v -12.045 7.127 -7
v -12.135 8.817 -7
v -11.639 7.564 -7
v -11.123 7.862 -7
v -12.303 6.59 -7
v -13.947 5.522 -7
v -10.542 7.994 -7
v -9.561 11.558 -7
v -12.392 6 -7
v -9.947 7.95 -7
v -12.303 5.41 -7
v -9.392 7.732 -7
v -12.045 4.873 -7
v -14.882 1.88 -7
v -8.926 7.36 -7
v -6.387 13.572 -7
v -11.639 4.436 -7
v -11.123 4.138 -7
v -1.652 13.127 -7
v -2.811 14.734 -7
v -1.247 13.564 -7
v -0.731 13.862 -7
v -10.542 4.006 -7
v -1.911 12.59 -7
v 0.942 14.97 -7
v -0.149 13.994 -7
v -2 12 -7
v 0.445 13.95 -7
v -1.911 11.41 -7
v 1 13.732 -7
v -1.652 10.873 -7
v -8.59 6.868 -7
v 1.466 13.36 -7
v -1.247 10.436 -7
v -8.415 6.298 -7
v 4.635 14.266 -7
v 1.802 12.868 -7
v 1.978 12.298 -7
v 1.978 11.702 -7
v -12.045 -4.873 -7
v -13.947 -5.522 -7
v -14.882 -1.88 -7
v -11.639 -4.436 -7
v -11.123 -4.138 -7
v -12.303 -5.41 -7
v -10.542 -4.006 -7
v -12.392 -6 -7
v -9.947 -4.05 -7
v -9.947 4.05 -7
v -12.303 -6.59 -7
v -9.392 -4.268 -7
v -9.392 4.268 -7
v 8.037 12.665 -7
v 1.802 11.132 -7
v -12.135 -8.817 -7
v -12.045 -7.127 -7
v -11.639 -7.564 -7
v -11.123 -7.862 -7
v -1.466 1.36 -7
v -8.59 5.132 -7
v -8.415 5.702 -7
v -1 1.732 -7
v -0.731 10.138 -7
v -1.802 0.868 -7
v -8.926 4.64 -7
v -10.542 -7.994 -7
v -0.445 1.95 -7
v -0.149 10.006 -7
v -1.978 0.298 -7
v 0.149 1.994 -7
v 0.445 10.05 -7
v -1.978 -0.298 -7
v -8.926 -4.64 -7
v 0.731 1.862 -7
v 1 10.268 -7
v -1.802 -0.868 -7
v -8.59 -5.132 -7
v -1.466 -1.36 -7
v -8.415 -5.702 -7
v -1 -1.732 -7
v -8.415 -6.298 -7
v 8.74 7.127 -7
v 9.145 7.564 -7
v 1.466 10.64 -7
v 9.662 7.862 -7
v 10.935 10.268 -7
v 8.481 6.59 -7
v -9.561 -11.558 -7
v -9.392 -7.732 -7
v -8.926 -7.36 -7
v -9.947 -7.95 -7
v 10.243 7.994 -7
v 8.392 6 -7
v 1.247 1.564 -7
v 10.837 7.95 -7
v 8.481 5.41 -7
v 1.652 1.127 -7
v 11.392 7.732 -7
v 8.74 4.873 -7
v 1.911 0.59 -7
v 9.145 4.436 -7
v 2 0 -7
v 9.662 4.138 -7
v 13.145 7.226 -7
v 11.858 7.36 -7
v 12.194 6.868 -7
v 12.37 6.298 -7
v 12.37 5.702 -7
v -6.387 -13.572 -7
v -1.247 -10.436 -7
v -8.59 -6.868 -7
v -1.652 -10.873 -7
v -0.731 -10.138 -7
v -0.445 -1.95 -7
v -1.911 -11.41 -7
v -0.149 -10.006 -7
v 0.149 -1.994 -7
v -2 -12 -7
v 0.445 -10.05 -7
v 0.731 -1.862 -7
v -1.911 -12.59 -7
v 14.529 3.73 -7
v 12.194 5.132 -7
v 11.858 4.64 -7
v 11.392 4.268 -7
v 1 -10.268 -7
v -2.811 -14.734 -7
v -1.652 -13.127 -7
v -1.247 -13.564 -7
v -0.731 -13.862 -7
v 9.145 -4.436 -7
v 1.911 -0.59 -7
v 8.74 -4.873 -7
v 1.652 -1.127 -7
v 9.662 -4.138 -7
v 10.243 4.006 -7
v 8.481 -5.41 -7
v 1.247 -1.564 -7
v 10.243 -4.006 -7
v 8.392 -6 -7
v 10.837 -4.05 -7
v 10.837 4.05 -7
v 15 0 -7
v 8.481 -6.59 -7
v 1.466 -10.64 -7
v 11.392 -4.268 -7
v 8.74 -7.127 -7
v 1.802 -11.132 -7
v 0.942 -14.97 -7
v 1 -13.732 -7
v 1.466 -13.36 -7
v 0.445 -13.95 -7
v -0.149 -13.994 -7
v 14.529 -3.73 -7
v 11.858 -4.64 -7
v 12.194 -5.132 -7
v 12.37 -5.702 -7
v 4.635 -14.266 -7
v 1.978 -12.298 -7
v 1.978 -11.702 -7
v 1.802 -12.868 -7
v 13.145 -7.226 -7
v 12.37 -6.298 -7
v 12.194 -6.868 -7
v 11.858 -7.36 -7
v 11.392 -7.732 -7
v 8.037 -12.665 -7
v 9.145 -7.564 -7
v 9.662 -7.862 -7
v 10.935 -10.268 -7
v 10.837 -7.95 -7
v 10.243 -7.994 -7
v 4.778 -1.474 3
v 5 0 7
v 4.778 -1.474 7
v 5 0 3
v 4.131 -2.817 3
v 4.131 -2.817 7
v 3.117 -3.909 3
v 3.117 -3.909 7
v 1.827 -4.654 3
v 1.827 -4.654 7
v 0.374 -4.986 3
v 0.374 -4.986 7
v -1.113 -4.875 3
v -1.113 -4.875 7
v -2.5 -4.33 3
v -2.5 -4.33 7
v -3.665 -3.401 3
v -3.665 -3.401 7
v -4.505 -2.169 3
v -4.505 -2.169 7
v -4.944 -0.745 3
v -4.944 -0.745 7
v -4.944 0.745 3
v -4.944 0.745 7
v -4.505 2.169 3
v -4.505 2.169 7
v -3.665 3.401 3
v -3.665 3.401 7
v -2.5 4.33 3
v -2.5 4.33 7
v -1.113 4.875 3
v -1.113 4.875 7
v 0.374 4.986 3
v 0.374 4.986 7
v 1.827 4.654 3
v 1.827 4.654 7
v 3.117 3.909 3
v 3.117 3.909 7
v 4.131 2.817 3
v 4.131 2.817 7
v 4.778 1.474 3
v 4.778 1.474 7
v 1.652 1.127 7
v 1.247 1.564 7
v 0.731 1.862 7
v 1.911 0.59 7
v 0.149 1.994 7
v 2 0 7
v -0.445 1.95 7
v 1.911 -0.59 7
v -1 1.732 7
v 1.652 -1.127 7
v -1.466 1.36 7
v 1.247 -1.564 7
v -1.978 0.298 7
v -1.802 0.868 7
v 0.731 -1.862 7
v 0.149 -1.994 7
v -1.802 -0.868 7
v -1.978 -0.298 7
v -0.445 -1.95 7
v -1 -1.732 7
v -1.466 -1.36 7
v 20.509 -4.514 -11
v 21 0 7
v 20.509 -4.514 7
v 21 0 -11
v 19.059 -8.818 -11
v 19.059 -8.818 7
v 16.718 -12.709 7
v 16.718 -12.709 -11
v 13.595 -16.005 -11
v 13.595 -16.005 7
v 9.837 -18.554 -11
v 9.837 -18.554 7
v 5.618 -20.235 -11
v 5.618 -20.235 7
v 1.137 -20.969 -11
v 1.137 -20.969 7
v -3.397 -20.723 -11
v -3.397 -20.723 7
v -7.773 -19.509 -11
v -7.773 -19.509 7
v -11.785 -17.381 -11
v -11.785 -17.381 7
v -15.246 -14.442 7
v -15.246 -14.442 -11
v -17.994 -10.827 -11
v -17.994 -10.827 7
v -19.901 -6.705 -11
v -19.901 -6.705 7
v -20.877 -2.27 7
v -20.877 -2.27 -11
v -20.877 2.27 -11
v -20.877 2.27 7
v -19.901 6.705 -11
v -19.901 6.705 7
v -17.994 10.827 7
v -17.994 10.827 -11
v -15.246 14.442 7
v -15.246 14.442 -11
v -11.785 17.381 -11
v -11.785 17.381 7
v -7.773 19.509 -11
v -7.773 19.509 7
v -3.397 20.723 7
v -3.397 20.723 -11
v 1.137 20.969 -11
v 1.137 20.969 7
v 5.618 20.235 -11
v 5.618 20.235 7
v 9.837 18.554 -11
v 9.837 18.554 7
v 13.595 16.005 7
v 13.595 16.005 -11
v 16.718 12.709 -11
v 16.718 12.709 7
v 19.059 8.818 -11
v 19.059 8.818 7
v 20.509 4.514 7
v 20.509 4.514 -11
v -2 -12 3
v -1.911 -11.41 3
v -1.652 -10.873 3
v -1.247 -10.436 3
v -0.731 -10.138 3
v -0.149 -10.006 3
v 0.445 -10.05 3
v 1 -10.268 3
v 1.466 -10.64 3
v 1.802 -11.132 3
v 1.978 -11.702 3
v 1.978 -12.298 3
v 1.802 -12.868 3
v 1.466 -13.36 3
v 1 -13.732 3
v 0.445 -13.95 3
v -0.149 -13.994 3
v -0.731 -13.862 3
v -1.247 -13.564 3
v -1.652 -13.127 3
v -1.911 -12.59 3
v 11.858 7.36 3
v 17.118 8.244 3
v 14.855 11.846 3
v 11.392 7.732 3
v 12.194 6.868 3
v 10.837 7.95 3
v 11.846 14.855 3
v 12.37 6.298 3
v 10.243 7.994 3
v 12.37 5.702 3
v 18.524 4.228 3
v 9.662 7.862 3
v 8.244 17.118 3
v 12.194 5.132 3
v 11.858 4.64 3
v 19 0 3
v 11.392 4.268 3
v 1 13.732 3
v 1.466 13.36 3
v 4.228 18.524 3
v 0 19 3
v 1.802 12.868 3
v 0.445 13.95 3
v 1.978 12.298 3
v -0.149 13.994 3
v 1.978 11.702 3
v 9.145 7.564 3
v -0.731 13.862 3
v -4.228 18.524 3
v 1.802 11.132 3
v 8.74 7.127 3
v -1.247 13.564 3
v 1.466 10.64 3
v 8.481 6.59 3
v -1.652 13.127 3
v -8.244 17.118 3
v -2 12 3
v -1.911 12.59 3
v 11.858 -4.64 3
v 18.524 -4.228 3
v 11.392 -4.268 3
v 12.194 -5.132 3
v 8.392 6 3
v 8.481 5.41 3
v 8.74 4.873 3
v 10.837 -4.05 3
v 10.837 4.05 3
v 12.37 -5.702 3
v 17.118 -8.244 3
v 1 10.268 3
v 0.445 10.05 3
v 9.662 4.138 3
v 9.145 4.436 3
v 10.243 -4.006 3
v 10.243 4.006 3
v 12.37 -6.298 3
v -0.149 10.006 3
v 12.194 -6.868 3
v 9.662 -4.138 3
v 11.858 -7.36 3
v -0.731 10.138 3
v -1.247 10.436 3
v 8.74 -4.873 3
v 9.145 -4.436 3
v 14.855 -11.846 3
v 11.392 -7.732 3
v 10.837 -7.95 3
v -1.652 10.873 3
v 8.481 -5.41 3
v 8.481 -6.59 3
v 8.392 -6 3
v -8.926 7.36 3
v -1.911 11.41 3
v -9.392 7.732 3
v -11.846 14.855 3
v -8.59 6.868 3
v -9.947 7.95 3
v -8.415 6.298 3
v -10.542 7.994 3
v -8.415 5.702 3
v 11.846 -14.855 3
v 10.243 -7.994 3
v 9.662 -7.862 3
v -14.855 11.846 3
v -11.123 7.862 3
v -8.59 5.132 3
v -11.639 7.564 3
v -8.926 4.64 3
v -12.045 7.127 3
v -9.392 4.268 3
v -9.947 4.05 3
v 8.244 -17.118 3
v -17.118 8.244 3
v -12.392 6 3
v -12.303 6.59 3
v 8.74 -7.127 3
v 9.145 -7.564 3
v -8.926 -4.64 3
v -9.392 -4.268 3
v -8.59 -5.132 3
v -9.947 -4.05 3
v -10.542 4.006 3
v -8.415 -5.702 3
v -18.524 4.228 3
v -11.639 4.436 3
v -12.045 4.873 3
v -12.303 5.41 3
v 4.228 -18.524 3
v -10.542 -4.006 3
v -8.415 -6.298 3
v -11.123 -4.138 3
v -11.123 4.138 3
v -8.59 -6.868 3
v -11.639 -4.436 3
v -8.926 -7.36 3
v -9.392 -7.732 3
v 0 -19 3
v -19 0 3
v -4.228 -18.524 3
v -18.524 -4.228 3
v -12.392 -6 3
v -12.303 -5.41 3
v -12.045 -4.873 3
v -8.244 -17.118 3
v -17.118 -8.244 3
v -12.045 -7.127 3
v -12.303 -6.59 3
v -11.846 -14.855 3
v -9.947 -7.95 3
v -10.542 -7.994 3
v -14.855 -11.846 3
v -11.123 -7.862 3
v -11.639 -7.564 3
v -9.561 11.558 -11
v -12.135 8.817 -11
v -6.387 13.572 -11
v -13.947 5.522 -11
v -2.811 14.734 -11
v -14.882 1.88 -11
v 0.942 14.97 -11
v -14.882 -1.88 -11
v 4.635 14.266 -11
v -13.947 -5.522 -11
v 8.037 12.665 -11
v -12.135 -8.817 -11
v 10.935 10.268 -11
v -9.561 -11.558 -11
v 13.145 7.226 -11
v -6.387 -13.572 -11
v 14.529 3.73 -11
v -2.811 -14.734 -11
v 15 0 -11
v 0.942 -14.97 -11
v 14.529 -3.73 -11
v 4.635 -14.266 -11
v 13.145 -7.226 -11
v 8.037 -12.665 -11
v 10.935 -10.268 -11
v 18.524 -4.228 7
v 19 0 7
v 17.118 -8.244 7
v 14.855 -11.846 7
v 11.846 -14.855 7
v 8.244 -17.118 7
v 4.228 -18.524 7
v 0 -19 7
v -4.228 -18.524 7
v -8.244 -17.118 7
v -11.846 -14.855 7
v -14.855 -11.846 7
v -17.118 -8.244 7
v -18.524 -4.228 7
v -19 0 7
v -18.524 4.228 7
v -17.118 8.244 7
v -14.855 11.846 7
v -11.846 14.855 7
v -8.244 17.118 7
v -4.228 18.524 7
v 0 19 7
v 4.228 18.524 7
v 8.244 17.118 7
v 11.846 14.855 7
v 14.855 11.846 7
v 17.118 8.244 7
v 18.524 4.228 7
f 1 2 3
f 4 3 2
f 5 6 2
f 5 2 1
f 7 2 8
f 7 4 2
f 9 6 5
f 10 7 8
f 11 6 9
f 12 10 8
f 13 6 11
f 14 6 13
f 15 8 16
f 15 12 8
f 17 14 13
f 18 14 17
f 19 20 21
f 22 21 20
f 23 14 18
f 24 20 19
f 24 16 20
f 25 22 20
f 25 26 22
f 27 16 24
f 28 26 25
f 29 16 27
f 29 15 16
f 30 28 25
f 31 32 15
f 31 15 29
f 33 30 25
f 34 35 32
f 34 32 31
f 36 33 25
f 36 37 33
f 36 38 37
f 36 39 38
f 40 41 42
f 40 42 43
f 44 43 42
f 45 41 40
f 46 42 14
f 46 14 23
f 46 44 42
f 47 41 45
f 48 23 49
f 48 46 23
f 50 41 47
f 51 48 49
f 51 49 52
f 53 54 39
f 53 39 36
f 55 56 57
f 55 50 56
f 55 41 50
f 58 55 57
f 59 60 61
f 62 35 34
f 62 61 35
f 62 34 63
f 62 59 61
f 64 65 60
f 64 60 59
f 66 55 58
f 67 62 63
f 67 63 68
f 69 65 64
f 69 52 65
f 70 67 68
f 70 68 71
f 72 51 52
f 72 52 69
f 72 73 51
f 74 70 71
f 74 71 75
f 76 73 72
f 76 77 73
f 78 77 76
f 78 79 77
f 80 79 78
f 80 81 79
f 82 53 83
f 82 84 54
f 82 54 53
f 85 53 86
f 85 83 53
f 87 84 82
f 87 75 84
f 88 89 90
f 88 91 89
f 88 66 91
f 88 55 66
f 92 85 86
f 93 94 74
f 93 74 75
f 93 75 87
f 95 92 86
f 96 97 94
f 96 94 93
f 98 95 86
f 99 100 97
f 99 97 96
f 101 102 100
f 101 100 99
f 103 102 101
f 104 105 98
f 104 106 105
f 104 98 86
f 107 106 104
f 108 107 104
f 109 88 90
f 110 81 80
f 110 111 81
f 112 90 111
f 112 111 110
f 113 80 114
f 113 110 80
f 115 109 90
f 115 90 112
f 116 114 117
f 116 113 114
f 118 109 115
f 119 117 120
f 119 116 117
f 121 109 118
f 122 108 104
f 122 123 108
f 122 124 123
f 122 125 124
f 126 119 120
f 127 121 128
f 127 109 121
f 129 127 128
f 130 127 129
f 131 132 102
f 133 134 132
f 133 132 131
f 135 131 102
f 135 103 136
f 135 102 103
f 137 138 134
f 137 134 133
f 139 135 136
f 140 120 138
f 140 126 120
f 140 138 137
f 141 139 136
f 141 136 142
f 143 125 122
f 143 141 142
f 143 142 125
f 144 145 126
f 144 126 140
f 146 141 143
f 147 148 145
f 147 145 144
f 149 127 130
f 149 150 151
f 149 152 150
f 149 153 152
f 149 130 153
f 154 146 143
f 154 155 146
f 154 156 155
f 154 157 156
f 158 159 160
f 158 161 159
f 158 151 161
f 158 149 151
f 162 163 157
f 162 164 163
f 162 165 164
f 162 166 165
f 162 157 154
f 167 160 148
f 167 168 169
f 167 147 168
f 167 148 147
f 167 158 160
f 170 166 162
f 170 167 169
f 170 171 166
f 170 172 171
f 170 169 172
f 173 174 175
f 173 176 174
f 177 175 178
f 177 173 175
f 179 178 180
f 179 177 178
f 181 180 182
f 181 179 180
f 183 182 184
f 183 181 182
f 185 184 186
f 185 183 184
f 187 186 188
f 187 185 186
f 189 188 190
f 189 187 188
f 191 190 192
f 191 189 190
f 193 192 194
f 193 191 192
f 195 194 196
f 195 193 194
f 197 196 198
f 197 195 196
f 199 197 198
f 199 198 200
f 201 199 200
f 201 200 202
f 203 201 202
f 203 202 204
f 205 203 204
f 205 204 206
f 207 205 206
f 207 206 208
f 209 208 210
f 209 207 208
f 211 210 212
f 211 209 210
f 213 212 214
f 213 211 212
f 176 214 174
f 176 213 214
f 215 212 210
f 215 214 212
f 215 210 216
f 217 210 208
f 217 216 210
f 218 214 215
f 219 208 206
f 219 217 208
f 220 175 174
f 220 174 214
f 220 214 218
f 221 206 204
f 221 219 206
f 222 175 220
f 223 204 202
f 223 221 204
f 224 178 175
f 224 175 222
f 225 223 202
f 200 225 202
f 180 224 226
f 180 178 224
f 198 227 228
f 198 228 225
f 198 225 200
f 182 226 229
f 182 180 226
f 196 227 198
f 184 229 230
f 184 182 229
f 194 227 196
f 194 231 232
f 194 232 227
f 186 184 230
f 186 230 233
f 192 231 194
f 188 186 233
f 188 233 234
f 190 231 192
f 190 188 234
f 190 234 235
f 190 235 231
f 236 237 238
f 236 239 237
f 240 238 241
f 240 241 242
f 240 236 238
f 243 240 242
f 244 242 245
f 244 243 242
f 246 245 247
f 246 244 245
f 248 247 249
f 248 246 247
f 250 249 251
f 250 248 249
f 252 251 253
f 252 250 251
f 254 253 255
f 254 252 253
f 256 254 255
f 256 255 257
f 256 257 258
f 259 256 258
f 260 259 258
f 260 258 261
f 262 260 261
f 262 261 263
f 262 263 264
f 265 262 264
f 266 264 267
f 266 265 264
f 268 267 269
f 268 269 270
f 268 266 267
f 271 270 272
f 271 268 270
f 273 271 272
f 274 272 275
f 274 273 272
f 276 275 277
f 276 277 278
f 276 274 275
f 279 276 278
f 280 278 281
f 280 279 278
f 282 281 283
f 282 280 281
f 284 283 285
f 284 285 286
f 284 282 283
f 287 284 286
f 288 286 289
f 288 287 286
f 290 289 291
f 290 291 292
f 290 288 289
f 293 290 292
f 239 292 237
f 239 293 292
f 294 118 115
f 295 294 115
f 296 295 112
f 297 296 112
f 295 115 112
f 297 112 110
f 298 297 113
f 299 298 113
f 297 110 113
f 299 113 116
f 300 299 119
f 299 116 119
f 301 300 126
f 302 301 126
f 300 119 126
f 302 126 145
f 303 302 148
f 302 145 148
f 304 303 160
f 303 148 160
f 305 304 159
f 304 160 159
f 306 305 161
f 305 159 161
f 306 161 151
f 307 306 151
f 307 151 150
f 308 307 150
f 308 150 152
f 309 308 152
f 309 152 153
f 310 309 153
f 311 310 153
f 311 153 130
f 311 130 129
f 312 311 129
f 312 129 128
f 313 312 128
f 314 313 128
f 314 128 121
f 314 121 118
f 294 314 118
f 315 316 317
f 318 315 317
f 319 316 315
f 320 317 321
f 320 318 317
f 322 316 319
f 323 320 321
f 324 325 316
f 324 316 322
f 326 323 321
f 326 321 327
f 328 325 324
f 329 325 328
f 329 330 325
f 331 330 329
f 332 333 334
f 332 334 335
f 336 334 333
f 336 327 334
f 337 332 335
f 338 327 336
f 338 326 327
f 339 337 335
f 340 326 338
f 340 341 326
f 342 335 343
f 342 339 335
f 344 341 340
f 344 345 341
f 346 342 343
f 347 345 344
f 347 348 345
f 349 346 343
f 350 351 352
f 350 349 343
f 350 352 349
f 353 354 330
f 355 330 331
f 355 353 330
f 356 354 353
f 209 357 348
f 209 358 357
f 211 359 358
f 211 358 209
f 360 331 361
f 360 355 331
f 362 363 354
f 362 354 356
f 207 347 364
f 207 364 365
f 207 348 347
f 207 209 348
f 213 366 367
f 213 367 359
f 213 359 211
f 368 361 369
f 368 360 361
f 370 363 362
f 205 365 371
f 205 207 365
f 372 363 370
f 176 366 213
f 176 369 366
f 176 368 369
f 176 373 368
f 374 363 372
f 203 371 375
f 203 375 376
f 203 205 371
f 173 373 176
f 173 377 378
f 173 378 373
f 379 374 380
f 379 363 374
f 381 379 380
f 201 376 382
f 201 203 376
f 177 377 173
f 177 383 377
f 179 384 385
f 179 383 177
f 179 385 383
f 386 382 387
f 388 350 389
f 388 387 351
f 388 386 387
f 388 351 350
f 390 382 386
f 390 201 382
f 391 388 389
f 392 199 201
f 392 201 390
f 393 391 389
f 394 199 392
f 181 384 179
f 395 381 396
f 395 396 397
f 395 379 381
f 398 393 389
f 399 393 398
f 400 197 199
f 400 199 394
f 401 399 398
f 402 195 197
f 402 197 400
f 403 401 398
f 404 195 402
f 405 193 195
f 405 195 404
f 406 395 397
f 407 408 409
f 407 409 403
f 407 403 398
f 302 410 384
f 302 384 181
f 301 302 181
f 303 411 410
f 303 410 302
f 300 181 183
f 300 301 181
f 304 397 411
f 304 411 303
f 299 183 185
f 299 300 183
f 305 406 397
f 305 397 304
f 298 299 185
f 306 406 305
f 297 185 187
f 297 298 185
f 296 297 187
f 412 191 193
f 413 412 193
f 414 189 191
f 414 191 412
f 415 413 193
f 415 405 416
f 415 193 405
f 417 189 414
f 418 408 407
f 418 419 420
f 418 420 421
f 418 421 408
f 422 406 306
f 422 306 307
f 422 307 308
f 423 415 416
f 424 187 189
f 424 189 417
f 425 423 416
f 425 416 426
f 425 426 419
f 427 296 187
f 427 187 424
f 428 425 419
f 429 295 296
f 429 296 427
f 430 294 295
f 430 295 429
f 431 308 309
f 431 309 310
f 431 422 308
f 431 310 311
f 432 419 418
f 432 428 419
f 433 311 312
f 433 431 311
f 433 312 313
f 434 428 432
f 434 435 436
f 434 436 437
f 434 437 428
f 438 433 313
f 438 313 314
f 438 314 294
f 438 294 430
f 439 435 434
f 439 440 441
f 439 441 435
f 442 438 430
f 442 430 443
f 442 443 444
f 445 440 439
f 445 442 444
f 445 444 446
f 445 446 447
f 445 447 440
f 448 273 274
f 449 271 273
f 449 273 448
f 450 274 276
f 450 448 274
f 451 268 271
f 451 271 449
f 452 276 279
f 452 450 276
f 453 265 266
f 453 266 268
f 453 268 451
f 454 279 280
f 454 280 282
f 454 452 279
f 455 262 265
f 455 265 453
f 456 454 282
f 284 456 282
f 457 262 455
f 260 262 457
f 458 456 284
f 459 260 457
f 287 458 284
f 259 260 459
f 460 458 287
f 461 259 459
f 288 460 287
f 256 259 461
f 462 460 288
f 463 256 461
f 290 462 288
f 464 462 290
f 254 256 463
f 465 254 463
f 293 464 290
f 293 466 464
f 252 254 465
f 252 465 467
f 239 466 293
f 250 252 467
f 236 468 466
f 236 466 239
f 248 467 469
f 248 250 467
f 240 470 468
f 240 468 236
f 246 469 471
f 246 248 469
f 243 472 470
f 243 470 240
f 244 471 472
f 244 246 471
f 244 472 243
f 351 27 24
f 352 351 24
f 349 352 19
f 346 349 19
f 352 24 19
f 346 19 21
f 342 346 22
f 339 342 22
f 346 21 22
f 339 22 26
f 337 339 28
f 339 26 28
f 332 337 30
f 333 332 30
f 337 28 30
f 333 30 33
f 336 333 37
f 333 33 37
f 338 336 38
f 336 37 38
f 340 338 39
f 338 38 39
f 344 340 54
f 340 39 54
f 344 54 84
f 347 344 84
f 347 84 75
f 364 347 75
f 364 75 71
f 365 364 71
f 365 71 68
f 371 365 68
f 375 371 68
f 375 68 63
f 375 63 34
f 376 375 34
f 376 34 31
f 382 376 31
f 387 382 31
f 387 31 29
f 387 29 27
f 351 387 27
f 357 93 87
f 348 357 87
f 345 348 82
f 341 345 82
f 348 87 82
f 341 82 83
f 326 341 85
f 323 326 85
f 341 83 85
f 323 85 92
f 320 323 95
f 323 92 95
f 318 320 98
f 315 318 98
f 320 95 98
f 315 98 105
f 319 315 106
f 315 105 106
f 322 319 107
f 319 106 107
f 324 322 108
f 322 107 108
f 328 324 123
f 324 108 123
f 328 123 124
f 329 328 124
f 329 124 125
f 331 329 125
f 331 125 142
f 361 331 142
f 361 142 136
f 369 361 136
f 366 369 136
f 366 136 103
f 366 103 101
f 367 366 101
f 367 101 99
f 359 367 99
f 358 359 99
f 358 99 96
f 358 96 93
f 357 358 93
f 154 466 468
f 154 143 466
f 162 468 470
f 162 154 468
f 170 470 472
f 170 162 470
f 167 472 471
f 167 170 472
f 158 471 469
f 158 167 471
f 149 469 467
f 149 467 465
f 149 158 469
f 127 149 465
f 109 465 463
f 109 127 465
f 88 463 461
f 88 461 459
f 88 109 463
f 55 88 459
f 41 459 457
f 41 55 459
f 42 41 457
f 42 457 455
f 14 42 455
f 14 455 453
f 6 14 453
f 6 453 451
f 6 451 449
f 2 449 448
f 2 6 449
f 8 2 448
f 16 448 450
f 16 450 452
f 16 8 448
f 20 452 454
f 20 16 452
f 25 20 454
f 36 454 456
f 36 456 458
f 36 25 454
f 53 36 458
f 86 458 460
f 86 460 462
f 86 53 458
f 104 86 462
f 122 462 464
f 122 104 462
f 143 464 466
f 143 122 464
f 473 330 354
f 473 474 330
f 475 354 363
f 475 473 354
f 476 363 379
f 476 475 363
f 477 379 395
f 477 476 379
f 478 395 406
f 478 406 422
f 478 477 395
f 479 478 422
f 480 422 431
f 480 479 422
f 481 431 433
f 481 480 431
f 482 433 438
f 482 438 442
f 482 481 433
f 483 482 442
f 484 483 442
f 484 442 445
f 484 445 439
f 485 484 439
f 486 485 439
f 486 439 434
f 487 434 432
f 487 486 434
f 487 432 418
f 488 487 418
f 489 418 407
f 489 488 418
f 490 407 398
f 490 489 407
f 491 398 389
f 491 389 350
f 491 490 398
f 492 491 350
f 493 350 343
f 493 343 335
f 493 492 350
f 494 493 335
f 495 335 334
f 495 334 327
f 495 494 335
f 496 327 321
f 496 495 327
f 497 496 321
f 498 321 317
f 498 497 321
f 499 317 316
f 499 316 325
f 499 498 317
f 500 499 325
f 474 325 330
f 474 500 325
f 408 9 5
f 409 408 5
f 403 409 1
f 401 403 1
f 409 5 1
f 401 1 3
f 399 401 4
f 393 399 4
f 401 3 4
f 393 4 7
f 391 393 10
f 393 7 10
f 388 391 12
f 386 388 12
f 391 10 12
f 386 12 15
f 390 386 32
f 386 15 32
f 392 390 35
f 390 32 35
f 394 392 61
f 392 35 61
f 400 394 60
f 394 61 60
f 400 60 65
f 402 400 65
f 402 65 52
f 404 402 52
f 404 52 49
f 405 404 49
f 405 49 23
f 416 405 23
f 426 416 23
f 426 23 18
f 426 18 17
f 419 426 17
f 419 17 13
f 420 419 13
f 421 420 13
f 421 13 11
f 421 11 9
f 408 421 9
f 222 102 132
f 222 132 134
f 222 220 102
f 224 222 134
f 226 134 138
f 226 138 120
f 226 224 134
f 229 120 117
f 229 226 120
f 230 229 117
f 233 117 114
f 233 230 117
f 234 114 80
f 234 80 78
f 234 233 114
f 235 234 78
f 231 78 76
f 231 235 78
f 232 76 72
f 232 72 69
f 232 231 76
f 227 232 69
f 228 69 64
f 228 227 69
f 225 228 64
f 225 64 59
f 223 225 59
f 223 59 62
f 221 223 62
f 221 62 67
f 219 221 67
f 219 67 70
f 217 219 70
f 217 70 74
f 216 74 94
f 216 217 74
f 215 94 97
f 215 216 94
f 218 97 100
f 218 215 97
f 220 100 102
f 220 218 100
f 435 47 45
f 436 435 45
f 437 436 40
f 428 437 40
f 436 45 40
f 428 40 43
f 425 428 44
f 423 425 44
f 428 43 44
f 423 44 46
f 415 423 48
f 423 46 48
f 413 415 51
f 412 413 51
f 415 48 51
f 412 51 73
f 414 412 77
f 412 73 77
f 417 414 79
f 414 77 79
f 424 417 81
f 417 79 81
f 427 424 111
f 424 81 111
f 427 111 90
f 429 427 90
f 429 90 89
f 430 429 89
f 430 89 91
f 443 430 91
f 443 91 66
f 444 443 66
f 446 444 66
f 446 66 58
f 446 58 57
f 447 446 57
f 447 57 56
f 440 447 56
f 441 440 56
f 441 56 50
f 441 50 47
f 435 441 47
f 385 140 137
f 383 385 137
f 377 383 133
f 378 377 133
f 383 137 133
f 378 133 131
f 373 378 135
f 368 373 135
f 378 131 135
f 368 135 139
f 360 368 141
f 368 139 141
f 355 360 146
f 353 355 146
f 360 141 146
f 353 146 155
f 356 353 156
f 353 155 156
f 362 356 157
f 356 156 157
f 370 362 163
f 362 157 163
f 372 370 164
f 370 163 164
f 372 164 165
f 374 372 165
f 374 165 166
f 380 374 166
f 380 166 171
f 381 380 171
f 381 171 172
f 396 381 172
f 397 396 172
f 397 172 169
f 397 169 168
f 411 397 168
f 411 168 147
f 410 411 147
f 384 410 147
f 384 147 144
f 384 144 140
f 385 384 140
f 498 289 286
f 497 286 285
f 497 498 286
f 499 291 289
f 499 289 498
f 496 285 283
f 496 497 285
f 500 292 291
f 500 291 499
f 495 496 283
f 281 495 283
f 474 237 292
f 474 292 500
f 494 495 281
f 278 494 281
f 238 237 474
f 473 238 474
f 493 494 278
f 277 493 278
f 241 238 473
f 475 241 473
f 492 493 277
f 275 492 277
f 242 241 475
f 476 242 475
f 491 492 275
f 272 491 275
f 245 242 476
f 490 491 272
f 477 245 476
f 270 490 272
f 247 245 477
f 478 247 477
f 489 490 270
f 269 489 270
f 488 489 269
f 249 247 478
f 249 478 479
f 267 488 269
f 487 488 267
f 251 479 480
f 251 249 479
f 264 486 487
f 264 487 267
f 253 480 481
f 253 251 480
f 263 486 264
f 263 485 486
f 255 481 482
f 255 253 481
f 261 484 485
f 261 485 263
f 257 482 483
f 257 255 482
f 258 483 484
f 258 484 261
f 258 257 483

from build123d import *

# Parameters (mm, degrees)
SKETCH2_R          = 2
CUT_EXTRUDE3_DEPTH = 33.832910319


with BuildPart() as part:
    # Sketch1 → Revolve1 (revolve)
    with BuildSketch(Plane(origin=(0, 0, 0), x_dir=(0, 0, -1), z_dir=(1, 0, 0)), mode=Mode.PRIVATE) as revolve1_sk:
        Polygon((-7, 2), (-7, 5), (-3, 5), (-3, 19), (-7, 19), (-7, 21), (11, 21), (11, 15), (7, 15), (7, 2), align=None)
    revolve(revolve1_sk.sketch.rotate(Axis((0, 0, 6.263706564), (0, 0, -1)), 90), axis=Axis((0, 0, 6.263706564), (0, 0, -1)))

    # Sketch2 → Cut-Extrude3 (cut, through all)
    with BuildSketch(Plane(origin=(0, 0, -7), x_dir=(-1, 0, 0), z_dir=(0, 0, -1))):
        with Locations((0, 12)):
            Circle(SKETCH2_R)
        with Locations((10.392304845, 6)):
            Circle(SKETCH2_R)
        with Locations((10.392304845, -6)):
            Circle(SKETCH2_R)
        with Locations((0, -12)):
            Circle(SKETCH2_R)
        with Locations((-10.392304845, -6)):
            Circle(SKETCH2_R)
        with Locations((-10.392304845, 6)):
            Circle(SKETCH2_R)
    extrude(amount=-CUT_EXTRUDE3_DEPTH, mode=Mode.SUBTRACT)


solid = part.part
